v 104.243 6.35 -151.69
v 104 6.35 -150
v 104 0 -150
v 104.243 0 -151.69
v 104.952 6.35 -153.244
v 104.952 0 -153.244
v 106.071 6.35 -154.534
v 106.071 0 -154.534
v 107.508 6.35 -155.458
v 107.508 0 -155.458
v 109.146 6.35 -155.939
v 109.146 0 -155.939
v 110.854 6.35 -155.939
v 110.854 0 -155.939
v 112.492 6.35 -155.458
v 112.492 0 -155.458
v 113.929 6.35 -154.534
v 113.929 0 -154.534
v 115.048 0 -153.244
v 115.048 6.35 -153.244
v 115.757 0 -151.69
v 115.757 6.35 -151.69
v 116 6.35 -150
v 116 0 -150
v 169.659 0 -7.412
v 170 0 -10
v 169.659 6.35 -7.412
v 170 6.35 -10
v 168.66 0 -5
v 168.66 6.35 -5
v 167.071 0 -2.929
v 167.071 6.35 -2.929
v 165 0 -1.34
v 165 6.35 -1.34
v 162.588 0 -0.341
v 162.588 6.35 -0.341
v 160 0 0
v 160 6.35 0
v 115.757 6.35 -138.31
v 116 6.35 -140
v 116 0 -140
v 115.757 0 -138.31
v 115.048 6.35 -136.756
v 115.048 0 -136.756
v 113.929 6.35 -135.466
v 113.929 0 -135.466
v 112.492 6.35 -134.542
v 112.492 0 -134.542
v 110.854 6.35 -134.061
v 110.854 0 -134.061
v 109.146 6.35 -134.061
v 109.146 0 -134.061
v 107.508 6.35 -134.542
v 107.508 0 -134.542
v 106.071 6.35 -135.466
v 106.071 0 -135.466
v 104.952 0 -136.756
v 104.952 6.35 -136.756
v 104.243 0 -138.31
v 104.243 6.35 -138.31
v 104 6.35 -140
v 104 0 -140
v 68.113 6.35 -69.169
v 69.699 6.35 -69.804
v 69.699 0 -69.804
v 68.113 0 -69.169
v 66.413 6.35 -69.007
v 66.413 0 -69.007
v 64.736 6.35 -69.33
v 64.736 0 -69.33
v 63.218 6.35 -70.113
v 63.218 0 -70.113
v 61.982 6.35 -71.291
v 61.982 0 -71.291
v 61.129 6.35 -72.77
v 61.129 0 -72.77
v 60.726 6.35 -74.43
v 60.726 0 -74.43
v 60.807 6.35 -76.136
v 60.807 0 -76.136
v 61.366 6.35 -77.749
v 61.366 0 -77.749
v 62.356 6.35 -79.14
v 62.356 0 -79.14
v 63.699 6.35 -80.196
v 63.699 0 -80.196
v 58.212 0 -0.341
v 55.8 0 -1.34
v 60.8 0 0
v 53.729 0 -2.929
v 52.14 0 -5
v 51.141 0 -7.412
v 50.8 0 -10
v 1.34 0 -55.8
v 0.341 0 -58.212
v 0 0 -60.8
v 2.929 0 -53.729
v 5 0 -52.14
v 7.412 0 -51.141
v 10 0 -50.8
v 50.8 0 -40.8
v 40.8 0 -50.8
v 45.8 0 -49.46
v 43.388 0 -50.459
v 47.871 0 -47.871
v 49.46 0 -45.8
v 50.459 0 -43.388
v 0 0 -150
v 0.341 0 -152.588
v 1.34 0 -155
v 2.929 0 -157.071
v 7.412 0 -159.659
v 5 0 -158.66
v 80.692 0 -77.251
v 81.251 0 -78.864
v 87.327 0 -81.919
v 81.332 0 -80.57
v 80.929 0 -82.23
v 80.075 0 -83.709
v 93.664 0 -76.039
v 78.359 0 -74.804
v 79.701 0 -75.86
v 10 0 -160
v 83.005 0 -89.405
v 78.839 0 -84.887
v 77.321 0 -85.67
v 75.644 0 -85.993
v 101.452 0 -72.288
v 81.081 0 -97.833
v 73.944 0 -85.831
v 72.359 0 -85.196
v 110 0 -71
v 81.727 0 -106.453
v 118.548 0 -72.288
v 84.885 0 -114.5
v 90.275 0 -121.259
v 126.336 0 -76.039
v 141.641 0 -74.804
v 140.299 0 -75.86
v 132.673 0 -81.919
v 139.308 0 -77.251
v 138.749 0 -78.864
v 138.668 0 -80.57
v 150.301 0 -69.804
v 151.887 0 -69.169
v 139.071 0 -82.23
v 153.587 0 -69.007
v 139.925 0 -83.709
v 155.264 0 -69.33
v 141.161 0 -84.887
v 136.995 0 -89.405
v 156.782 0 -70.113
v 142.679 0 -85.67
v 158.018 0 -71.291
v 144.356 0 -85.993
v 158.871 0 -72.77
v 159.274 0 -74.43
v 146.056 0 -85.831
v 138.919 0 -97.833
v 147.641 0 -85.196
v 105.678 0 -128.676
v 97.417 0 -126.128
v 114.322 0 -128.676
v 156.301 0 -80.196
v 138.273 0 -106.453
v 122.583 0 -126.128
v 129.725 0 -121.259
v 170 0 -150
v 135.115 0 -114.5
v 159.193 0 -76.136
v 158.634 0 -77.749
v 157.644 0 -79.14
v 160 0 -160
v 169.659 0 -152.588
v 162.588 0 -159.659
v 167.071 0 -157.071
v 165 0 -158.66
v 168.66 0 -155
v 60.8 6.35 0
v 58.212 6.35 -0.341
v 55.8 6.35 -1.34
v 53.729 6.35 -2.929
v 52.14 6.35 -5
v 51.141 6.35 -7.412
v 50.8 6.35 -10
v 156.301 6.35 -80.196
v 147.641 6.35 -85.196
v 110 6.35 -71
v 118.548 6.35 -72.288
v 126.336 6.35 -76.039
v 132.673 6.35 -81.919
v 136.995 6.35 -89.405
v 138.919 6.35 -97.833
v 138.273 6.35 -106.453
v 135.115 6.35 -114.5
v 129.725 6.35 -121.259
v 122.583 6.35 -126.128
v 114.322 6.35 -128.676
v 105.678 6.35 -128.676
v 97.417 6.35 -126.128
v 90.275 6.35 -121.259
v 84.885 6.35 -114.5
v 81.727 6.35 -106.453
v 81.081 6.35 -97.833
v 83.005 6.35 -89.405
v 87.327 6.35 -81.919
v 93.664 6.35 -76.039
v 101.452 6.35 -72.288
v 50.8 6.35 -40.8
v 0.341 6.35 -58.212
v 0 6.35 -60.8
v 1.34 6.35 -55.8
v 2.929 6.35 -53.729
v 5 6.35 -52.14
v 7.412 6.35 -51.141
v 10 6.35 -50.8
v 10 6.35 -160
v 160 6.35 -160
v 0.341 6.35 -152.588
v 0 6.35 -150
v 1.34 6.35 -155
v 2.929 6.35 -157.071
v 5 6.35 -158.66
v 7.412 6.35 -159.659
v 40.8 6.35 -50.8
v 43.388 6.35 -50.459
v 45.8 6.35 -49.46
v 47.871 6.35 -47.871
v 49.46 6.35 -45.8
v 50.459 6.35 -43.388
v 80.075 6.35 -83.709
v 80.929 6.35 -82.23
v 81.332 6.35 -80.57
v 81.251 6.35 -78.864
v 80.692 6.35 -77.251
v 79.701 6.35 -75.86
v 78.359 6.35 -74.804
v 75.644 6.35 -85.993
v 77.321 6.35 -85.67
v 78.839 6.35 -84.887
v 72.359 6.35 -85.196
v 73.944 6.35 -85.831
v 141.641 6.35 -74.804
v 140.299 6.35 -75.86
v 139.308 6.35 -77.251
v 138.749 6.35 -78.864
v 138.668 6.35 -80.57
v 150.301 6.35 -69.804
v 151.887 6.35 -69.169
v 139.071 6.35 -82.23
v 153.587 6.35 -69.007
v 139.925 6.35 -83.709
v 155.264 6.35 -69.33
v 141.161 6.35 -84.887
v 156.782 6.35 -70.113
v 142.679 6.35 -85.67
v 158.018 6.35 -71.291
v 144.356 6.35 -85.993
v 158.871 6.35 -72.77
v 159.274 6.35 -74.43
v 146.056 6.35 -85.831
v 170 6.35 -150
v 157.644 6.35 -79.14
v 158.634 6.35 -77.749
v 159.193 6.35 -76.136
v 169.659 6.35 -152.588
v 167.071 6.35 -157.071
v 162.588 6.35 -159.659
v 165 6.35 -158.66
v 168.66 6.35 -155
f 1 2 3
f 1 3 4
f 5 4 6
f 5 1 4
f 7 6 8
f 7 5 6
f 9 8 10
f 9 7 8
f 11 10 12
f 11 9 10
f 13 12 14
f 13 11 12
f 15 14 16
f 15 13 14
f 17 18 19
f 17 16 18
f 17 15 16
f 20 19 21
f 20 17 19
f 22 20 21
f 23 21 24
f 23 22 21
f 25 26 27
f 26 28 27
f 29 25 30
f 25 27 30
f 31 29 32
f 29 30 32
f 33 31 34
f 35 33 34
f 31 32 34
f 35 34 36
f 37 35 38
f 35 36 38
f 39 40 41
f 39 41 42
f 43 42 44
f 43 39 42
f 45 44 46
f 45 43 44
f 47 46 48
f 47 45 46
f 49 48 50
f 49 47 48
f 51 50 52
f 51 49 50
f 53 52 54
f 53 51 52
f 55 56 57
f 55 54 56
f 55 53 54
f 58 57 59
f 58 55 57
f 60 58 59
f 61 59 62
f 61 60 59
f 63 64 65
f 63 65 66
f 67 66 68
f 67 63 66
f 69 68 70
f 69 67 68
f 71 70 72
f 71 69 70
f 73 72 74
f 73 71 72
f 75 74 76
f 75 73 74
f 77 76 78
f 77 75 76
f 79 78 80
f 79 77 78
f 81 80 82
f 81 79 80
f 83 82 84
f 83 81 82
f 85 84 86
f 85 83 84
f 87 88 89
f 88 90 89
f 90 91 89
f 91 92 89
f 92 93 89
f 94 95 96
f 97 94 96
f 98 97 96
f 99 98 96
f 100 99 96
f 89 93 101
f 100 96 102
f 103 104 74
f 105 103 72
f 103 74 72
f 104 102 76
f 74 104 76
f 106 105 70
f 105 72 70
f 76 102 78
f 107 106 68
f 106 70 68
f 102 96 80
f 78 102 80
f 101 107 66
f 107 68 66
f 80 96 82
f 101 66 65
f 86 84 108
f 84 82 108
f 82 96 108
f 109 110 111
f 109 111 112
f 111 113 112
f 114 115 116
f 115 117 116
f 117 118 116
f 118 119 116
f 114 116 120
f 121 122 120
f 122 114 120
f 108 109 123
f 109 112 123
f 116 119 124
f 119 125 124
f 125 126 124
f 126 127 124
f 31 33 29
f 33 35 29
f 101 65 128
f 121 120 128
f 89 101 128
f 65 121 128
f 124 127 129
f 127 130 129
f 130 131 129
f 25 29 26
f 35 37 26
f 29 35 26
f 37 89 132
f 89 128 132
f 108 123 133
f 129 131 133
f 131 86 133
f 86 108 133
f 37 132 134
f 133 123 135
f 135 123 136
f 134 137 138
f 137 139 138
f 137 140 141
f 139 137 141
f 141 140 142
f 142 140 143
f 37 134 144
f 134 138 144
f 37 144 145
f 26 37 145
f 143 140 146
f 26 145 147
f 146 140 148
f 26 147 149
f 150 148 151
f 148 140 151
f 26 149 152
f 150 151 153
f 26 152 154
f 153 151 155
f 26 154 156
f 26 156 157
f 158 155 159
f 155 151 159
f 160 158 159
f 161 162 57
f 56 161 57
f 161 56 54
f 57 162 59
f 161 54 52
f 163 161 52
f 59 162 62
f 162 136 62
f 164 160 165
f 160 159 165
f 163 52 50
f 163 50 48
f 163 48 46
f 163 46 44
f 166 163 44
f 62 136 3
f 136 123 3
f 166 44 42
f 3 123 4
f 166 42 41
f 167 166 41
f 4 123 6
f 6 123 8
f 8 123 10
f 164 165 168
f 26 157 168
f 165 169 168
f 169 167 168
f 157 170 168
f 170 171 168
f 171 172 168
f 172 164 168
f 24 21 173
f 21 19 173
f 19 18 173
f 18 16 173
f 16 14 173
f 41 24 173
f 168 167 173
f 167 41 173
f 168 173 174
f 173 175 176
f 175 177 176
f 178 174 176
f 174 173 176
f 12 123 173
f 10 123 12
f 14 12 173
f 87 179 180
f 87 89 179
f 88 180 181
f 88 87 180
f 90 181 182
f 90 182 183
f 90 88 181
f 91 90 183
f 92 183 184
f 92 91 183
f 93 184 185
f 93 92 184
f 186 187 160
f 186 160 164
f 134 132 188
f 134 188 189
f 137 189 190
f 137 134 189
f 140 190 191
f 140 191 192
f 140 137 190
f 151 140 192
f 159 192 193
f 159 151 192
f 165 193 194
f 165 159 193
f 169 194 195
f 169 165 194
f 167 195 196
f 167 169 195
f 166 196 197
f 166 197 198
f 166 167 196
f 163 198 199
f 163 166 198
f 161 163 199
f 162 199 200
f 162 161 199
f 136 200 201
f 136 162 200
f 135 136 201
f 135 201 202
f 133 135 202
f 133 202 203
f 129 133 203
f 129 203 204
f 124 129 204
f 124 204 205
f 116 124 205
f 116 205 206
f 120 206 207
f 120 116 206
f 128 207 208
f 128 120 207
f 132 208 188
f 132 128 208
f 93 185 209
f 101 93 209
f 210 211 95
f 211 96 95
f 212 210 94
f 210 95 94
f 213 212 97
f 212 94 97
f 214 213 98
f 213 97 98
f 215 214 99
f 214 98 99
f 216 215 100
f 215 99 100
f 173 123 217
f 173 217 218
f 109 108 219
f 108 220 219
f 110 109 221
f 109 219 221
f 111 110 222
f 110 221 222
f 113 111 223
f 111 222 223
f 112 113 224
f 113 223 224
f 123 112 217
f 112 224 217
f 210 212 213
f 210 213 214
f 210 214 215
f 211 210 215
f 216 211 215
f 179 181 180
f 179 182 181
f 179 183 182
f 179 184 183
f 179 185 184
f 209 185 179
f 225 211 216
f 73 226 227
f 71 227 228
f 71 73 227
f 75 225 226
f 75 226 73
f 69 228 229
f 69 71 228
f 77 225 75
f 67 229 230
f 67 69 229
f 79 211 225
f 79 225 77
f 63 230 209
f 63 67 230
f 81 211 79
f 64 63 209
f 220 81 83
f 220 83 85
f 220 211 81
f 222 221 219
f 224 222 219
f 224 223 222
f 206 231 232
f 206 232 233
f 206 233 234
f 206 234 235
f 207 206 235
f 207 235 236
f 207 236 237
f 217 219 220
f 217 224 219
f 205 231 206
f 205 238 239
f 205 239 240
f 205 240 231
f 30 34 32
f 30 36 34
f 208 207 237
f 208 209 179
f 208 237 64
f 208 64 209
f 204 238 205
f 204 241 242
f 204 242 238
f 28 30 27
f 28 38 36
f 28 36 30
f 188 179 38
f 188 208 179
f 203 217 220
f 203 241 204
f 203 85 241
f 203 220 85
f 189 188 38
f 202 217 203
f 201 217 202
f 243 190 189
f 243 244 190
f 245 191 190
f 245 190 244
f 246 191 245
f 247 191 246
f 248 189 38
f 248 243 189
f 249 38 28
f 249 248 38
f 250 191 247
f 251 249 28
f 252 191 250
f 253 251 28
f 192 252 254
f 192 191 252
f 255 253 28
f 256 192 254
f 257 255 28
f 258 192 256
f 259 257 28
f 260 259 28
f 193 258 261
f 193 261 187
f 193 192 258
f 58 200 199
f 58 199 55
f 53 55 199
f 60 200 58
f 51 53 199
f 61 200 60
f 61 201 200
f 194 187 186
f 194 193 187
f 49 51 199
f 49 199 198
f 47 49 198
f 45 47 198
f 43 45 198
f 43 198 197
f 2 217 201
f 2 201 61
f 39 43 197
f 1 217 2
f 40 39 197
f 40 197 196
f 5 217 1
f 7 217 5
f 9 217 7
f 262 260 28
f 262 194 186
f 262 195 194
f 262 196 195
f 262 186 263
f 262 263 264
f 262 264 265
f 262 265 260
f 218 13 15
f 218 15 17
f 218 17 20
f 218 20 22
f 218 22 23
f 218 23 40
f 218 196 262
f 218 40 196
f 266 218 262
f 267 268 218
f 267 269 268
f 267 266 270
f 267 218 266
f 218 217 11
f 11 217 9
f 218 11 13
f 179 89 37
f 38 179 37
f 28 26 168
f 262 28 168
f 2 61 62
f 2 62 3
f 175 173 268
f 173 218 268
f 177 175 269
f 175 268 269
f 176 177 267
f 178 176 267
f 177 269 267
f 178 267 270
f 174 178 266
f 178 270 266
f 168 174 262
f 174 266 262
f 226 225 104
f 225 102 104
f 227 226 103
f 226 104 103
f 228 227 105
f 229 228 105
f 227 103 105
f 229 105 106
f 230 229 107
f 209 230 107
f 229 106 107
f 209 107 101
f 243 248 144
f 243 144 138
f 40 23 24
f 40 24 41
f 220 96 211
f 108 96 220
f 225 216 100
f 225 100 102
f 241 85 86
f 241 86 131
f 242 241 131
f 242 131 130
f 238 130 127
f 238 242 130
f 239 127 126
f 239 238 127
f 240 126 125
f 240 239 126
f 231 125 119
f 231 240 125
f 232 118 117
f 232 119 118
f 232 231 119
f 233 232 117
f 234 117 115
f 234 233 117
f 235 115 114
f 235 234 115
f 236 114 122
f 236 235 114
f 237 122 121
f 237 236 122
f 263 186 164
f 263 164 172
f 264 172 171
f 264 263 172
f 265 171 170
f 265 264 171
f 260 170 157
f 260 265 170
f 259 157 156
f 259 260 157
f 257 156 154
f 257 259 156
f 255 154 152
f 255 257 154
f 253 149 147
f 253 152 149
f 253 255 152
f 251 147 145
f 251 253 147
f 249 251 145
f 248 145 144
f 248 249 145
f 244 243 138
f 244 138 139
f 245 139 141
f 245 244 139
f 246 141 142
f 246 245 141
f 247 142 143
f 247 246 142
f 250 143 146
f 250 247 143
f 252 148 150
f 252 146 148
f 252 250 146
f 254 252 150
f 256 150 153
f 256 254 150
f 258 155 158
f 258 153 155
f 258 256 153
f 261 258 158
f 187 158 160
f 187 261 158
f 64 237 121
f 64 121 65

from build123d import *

# Parameters (mm, degrees)
SKETCH1_W           = 170
SKETCH1_H           = 160
SKETCH1_R           = 29
BOSS_EXTRUDE1_DEPTH = 6.35
SKETCH2_W           = 50.8
SKETCH2_H           = 50.8
CUT_EXTRUDE1_DEPTH  = 234.538695937
FILLET1_R           = 10
CUT_EXTRUDE2_DEPTH  = 234.538695937


with BuildPart() as part:
    # Sketch1 → Boss-Extrude1 (new body)
    with BuildSketch(Plane(origin=(0, 0, 0), x_dir=(1, 0, 0), z_dir=(0, 1, 0))):
        with Locations((85, 80)):
            Rectangle(SKETCH1_W, SKETCH1_H)
        with Locations(Location((110, 100, 0), (0, 0, 270))):
            Circle(SKETCH1_R, mode=Mode.SUBTRACT)
    extrude(amount=BOSS_EXTRUDE1_DEPTH)

    # Sketch2 → Cut-Extrude1 (cut, through all)
    with BuildSketch(Plane(origin=(0, 6.35, 0), x_dir=(1, 0, 0), z_dir=(0, 1, 0))):
        with Locations((25.4, 25.4)):
            Rectangle(SKETCH2_W, SKETCH2_H)
    extrude(amount=-CUT_EXTRUDE1_DEPTH, mode=Mode.SUBTRACT)

    # Fillet1
    fillet1_edges = [part.edges().sort_by_distance(p)[0] for p in [
        (0, 3.175, -50.8),
        (50.8, 3.175, -50.8),
        (50.8, 3.175, 0),
        (0, 3.175, -160),
        (170, 3.175, -160),
        (170, 3.175, 0),
    ]]
    fillet(fillet1_edges, radius=FILLET1_R)

    # Sketch3 → Cut-Extrude2 (cut, through all)
    with BuildSketch(Plane(origin=(0, 6.35, 0), x_dir=(1, 0, 0), z_dir=(0, 1, 0))):
        with BuildLine():
            Line((63.698729811, 80.196152423), (72.358983849, 85.196152423))
            ThreePointArc((72.358983849, 85.196152423), (80.555136271, 83), (78.358983849, 74.803847577))
            Line((78.358983849, 74.803847577), (69.698729811, 69.803847577))
            ThreePointArc((69.698729811, 69.803847577), (61.502577388, 72), (63.698729811, 80.196152423))
        make_face()
        with BuildLine():
            Line((150.301270189, 69.803847577), (141.641016151, 74.803847577))
            ThreePointArc((141.641016151, 74.803847577), (139.444863729, 83), (147.641016151, 85.196152423))
            Line((147.641016151, 85.196152423), (156.301270189, 80.196152423))
            ThreePointArc((156.301270189, 80.196152423), (158.497422612, 72), (150.301270189, 69.803847577))
        make_face()
        with BuildLine():
            Line((116, 150), (116, 140))
            ThreePointArc((116, 140), (110, 134), (104, 140))
            Line((104, 140), (104, 150))
            ThreePointArc((104, 150), (110, 156), (116, 150))
        make_face()
    extrude(amount=-CUT_EXTRUDE2_DEPTH, mode=Mode.SUBTRACT)


solid = part.part
